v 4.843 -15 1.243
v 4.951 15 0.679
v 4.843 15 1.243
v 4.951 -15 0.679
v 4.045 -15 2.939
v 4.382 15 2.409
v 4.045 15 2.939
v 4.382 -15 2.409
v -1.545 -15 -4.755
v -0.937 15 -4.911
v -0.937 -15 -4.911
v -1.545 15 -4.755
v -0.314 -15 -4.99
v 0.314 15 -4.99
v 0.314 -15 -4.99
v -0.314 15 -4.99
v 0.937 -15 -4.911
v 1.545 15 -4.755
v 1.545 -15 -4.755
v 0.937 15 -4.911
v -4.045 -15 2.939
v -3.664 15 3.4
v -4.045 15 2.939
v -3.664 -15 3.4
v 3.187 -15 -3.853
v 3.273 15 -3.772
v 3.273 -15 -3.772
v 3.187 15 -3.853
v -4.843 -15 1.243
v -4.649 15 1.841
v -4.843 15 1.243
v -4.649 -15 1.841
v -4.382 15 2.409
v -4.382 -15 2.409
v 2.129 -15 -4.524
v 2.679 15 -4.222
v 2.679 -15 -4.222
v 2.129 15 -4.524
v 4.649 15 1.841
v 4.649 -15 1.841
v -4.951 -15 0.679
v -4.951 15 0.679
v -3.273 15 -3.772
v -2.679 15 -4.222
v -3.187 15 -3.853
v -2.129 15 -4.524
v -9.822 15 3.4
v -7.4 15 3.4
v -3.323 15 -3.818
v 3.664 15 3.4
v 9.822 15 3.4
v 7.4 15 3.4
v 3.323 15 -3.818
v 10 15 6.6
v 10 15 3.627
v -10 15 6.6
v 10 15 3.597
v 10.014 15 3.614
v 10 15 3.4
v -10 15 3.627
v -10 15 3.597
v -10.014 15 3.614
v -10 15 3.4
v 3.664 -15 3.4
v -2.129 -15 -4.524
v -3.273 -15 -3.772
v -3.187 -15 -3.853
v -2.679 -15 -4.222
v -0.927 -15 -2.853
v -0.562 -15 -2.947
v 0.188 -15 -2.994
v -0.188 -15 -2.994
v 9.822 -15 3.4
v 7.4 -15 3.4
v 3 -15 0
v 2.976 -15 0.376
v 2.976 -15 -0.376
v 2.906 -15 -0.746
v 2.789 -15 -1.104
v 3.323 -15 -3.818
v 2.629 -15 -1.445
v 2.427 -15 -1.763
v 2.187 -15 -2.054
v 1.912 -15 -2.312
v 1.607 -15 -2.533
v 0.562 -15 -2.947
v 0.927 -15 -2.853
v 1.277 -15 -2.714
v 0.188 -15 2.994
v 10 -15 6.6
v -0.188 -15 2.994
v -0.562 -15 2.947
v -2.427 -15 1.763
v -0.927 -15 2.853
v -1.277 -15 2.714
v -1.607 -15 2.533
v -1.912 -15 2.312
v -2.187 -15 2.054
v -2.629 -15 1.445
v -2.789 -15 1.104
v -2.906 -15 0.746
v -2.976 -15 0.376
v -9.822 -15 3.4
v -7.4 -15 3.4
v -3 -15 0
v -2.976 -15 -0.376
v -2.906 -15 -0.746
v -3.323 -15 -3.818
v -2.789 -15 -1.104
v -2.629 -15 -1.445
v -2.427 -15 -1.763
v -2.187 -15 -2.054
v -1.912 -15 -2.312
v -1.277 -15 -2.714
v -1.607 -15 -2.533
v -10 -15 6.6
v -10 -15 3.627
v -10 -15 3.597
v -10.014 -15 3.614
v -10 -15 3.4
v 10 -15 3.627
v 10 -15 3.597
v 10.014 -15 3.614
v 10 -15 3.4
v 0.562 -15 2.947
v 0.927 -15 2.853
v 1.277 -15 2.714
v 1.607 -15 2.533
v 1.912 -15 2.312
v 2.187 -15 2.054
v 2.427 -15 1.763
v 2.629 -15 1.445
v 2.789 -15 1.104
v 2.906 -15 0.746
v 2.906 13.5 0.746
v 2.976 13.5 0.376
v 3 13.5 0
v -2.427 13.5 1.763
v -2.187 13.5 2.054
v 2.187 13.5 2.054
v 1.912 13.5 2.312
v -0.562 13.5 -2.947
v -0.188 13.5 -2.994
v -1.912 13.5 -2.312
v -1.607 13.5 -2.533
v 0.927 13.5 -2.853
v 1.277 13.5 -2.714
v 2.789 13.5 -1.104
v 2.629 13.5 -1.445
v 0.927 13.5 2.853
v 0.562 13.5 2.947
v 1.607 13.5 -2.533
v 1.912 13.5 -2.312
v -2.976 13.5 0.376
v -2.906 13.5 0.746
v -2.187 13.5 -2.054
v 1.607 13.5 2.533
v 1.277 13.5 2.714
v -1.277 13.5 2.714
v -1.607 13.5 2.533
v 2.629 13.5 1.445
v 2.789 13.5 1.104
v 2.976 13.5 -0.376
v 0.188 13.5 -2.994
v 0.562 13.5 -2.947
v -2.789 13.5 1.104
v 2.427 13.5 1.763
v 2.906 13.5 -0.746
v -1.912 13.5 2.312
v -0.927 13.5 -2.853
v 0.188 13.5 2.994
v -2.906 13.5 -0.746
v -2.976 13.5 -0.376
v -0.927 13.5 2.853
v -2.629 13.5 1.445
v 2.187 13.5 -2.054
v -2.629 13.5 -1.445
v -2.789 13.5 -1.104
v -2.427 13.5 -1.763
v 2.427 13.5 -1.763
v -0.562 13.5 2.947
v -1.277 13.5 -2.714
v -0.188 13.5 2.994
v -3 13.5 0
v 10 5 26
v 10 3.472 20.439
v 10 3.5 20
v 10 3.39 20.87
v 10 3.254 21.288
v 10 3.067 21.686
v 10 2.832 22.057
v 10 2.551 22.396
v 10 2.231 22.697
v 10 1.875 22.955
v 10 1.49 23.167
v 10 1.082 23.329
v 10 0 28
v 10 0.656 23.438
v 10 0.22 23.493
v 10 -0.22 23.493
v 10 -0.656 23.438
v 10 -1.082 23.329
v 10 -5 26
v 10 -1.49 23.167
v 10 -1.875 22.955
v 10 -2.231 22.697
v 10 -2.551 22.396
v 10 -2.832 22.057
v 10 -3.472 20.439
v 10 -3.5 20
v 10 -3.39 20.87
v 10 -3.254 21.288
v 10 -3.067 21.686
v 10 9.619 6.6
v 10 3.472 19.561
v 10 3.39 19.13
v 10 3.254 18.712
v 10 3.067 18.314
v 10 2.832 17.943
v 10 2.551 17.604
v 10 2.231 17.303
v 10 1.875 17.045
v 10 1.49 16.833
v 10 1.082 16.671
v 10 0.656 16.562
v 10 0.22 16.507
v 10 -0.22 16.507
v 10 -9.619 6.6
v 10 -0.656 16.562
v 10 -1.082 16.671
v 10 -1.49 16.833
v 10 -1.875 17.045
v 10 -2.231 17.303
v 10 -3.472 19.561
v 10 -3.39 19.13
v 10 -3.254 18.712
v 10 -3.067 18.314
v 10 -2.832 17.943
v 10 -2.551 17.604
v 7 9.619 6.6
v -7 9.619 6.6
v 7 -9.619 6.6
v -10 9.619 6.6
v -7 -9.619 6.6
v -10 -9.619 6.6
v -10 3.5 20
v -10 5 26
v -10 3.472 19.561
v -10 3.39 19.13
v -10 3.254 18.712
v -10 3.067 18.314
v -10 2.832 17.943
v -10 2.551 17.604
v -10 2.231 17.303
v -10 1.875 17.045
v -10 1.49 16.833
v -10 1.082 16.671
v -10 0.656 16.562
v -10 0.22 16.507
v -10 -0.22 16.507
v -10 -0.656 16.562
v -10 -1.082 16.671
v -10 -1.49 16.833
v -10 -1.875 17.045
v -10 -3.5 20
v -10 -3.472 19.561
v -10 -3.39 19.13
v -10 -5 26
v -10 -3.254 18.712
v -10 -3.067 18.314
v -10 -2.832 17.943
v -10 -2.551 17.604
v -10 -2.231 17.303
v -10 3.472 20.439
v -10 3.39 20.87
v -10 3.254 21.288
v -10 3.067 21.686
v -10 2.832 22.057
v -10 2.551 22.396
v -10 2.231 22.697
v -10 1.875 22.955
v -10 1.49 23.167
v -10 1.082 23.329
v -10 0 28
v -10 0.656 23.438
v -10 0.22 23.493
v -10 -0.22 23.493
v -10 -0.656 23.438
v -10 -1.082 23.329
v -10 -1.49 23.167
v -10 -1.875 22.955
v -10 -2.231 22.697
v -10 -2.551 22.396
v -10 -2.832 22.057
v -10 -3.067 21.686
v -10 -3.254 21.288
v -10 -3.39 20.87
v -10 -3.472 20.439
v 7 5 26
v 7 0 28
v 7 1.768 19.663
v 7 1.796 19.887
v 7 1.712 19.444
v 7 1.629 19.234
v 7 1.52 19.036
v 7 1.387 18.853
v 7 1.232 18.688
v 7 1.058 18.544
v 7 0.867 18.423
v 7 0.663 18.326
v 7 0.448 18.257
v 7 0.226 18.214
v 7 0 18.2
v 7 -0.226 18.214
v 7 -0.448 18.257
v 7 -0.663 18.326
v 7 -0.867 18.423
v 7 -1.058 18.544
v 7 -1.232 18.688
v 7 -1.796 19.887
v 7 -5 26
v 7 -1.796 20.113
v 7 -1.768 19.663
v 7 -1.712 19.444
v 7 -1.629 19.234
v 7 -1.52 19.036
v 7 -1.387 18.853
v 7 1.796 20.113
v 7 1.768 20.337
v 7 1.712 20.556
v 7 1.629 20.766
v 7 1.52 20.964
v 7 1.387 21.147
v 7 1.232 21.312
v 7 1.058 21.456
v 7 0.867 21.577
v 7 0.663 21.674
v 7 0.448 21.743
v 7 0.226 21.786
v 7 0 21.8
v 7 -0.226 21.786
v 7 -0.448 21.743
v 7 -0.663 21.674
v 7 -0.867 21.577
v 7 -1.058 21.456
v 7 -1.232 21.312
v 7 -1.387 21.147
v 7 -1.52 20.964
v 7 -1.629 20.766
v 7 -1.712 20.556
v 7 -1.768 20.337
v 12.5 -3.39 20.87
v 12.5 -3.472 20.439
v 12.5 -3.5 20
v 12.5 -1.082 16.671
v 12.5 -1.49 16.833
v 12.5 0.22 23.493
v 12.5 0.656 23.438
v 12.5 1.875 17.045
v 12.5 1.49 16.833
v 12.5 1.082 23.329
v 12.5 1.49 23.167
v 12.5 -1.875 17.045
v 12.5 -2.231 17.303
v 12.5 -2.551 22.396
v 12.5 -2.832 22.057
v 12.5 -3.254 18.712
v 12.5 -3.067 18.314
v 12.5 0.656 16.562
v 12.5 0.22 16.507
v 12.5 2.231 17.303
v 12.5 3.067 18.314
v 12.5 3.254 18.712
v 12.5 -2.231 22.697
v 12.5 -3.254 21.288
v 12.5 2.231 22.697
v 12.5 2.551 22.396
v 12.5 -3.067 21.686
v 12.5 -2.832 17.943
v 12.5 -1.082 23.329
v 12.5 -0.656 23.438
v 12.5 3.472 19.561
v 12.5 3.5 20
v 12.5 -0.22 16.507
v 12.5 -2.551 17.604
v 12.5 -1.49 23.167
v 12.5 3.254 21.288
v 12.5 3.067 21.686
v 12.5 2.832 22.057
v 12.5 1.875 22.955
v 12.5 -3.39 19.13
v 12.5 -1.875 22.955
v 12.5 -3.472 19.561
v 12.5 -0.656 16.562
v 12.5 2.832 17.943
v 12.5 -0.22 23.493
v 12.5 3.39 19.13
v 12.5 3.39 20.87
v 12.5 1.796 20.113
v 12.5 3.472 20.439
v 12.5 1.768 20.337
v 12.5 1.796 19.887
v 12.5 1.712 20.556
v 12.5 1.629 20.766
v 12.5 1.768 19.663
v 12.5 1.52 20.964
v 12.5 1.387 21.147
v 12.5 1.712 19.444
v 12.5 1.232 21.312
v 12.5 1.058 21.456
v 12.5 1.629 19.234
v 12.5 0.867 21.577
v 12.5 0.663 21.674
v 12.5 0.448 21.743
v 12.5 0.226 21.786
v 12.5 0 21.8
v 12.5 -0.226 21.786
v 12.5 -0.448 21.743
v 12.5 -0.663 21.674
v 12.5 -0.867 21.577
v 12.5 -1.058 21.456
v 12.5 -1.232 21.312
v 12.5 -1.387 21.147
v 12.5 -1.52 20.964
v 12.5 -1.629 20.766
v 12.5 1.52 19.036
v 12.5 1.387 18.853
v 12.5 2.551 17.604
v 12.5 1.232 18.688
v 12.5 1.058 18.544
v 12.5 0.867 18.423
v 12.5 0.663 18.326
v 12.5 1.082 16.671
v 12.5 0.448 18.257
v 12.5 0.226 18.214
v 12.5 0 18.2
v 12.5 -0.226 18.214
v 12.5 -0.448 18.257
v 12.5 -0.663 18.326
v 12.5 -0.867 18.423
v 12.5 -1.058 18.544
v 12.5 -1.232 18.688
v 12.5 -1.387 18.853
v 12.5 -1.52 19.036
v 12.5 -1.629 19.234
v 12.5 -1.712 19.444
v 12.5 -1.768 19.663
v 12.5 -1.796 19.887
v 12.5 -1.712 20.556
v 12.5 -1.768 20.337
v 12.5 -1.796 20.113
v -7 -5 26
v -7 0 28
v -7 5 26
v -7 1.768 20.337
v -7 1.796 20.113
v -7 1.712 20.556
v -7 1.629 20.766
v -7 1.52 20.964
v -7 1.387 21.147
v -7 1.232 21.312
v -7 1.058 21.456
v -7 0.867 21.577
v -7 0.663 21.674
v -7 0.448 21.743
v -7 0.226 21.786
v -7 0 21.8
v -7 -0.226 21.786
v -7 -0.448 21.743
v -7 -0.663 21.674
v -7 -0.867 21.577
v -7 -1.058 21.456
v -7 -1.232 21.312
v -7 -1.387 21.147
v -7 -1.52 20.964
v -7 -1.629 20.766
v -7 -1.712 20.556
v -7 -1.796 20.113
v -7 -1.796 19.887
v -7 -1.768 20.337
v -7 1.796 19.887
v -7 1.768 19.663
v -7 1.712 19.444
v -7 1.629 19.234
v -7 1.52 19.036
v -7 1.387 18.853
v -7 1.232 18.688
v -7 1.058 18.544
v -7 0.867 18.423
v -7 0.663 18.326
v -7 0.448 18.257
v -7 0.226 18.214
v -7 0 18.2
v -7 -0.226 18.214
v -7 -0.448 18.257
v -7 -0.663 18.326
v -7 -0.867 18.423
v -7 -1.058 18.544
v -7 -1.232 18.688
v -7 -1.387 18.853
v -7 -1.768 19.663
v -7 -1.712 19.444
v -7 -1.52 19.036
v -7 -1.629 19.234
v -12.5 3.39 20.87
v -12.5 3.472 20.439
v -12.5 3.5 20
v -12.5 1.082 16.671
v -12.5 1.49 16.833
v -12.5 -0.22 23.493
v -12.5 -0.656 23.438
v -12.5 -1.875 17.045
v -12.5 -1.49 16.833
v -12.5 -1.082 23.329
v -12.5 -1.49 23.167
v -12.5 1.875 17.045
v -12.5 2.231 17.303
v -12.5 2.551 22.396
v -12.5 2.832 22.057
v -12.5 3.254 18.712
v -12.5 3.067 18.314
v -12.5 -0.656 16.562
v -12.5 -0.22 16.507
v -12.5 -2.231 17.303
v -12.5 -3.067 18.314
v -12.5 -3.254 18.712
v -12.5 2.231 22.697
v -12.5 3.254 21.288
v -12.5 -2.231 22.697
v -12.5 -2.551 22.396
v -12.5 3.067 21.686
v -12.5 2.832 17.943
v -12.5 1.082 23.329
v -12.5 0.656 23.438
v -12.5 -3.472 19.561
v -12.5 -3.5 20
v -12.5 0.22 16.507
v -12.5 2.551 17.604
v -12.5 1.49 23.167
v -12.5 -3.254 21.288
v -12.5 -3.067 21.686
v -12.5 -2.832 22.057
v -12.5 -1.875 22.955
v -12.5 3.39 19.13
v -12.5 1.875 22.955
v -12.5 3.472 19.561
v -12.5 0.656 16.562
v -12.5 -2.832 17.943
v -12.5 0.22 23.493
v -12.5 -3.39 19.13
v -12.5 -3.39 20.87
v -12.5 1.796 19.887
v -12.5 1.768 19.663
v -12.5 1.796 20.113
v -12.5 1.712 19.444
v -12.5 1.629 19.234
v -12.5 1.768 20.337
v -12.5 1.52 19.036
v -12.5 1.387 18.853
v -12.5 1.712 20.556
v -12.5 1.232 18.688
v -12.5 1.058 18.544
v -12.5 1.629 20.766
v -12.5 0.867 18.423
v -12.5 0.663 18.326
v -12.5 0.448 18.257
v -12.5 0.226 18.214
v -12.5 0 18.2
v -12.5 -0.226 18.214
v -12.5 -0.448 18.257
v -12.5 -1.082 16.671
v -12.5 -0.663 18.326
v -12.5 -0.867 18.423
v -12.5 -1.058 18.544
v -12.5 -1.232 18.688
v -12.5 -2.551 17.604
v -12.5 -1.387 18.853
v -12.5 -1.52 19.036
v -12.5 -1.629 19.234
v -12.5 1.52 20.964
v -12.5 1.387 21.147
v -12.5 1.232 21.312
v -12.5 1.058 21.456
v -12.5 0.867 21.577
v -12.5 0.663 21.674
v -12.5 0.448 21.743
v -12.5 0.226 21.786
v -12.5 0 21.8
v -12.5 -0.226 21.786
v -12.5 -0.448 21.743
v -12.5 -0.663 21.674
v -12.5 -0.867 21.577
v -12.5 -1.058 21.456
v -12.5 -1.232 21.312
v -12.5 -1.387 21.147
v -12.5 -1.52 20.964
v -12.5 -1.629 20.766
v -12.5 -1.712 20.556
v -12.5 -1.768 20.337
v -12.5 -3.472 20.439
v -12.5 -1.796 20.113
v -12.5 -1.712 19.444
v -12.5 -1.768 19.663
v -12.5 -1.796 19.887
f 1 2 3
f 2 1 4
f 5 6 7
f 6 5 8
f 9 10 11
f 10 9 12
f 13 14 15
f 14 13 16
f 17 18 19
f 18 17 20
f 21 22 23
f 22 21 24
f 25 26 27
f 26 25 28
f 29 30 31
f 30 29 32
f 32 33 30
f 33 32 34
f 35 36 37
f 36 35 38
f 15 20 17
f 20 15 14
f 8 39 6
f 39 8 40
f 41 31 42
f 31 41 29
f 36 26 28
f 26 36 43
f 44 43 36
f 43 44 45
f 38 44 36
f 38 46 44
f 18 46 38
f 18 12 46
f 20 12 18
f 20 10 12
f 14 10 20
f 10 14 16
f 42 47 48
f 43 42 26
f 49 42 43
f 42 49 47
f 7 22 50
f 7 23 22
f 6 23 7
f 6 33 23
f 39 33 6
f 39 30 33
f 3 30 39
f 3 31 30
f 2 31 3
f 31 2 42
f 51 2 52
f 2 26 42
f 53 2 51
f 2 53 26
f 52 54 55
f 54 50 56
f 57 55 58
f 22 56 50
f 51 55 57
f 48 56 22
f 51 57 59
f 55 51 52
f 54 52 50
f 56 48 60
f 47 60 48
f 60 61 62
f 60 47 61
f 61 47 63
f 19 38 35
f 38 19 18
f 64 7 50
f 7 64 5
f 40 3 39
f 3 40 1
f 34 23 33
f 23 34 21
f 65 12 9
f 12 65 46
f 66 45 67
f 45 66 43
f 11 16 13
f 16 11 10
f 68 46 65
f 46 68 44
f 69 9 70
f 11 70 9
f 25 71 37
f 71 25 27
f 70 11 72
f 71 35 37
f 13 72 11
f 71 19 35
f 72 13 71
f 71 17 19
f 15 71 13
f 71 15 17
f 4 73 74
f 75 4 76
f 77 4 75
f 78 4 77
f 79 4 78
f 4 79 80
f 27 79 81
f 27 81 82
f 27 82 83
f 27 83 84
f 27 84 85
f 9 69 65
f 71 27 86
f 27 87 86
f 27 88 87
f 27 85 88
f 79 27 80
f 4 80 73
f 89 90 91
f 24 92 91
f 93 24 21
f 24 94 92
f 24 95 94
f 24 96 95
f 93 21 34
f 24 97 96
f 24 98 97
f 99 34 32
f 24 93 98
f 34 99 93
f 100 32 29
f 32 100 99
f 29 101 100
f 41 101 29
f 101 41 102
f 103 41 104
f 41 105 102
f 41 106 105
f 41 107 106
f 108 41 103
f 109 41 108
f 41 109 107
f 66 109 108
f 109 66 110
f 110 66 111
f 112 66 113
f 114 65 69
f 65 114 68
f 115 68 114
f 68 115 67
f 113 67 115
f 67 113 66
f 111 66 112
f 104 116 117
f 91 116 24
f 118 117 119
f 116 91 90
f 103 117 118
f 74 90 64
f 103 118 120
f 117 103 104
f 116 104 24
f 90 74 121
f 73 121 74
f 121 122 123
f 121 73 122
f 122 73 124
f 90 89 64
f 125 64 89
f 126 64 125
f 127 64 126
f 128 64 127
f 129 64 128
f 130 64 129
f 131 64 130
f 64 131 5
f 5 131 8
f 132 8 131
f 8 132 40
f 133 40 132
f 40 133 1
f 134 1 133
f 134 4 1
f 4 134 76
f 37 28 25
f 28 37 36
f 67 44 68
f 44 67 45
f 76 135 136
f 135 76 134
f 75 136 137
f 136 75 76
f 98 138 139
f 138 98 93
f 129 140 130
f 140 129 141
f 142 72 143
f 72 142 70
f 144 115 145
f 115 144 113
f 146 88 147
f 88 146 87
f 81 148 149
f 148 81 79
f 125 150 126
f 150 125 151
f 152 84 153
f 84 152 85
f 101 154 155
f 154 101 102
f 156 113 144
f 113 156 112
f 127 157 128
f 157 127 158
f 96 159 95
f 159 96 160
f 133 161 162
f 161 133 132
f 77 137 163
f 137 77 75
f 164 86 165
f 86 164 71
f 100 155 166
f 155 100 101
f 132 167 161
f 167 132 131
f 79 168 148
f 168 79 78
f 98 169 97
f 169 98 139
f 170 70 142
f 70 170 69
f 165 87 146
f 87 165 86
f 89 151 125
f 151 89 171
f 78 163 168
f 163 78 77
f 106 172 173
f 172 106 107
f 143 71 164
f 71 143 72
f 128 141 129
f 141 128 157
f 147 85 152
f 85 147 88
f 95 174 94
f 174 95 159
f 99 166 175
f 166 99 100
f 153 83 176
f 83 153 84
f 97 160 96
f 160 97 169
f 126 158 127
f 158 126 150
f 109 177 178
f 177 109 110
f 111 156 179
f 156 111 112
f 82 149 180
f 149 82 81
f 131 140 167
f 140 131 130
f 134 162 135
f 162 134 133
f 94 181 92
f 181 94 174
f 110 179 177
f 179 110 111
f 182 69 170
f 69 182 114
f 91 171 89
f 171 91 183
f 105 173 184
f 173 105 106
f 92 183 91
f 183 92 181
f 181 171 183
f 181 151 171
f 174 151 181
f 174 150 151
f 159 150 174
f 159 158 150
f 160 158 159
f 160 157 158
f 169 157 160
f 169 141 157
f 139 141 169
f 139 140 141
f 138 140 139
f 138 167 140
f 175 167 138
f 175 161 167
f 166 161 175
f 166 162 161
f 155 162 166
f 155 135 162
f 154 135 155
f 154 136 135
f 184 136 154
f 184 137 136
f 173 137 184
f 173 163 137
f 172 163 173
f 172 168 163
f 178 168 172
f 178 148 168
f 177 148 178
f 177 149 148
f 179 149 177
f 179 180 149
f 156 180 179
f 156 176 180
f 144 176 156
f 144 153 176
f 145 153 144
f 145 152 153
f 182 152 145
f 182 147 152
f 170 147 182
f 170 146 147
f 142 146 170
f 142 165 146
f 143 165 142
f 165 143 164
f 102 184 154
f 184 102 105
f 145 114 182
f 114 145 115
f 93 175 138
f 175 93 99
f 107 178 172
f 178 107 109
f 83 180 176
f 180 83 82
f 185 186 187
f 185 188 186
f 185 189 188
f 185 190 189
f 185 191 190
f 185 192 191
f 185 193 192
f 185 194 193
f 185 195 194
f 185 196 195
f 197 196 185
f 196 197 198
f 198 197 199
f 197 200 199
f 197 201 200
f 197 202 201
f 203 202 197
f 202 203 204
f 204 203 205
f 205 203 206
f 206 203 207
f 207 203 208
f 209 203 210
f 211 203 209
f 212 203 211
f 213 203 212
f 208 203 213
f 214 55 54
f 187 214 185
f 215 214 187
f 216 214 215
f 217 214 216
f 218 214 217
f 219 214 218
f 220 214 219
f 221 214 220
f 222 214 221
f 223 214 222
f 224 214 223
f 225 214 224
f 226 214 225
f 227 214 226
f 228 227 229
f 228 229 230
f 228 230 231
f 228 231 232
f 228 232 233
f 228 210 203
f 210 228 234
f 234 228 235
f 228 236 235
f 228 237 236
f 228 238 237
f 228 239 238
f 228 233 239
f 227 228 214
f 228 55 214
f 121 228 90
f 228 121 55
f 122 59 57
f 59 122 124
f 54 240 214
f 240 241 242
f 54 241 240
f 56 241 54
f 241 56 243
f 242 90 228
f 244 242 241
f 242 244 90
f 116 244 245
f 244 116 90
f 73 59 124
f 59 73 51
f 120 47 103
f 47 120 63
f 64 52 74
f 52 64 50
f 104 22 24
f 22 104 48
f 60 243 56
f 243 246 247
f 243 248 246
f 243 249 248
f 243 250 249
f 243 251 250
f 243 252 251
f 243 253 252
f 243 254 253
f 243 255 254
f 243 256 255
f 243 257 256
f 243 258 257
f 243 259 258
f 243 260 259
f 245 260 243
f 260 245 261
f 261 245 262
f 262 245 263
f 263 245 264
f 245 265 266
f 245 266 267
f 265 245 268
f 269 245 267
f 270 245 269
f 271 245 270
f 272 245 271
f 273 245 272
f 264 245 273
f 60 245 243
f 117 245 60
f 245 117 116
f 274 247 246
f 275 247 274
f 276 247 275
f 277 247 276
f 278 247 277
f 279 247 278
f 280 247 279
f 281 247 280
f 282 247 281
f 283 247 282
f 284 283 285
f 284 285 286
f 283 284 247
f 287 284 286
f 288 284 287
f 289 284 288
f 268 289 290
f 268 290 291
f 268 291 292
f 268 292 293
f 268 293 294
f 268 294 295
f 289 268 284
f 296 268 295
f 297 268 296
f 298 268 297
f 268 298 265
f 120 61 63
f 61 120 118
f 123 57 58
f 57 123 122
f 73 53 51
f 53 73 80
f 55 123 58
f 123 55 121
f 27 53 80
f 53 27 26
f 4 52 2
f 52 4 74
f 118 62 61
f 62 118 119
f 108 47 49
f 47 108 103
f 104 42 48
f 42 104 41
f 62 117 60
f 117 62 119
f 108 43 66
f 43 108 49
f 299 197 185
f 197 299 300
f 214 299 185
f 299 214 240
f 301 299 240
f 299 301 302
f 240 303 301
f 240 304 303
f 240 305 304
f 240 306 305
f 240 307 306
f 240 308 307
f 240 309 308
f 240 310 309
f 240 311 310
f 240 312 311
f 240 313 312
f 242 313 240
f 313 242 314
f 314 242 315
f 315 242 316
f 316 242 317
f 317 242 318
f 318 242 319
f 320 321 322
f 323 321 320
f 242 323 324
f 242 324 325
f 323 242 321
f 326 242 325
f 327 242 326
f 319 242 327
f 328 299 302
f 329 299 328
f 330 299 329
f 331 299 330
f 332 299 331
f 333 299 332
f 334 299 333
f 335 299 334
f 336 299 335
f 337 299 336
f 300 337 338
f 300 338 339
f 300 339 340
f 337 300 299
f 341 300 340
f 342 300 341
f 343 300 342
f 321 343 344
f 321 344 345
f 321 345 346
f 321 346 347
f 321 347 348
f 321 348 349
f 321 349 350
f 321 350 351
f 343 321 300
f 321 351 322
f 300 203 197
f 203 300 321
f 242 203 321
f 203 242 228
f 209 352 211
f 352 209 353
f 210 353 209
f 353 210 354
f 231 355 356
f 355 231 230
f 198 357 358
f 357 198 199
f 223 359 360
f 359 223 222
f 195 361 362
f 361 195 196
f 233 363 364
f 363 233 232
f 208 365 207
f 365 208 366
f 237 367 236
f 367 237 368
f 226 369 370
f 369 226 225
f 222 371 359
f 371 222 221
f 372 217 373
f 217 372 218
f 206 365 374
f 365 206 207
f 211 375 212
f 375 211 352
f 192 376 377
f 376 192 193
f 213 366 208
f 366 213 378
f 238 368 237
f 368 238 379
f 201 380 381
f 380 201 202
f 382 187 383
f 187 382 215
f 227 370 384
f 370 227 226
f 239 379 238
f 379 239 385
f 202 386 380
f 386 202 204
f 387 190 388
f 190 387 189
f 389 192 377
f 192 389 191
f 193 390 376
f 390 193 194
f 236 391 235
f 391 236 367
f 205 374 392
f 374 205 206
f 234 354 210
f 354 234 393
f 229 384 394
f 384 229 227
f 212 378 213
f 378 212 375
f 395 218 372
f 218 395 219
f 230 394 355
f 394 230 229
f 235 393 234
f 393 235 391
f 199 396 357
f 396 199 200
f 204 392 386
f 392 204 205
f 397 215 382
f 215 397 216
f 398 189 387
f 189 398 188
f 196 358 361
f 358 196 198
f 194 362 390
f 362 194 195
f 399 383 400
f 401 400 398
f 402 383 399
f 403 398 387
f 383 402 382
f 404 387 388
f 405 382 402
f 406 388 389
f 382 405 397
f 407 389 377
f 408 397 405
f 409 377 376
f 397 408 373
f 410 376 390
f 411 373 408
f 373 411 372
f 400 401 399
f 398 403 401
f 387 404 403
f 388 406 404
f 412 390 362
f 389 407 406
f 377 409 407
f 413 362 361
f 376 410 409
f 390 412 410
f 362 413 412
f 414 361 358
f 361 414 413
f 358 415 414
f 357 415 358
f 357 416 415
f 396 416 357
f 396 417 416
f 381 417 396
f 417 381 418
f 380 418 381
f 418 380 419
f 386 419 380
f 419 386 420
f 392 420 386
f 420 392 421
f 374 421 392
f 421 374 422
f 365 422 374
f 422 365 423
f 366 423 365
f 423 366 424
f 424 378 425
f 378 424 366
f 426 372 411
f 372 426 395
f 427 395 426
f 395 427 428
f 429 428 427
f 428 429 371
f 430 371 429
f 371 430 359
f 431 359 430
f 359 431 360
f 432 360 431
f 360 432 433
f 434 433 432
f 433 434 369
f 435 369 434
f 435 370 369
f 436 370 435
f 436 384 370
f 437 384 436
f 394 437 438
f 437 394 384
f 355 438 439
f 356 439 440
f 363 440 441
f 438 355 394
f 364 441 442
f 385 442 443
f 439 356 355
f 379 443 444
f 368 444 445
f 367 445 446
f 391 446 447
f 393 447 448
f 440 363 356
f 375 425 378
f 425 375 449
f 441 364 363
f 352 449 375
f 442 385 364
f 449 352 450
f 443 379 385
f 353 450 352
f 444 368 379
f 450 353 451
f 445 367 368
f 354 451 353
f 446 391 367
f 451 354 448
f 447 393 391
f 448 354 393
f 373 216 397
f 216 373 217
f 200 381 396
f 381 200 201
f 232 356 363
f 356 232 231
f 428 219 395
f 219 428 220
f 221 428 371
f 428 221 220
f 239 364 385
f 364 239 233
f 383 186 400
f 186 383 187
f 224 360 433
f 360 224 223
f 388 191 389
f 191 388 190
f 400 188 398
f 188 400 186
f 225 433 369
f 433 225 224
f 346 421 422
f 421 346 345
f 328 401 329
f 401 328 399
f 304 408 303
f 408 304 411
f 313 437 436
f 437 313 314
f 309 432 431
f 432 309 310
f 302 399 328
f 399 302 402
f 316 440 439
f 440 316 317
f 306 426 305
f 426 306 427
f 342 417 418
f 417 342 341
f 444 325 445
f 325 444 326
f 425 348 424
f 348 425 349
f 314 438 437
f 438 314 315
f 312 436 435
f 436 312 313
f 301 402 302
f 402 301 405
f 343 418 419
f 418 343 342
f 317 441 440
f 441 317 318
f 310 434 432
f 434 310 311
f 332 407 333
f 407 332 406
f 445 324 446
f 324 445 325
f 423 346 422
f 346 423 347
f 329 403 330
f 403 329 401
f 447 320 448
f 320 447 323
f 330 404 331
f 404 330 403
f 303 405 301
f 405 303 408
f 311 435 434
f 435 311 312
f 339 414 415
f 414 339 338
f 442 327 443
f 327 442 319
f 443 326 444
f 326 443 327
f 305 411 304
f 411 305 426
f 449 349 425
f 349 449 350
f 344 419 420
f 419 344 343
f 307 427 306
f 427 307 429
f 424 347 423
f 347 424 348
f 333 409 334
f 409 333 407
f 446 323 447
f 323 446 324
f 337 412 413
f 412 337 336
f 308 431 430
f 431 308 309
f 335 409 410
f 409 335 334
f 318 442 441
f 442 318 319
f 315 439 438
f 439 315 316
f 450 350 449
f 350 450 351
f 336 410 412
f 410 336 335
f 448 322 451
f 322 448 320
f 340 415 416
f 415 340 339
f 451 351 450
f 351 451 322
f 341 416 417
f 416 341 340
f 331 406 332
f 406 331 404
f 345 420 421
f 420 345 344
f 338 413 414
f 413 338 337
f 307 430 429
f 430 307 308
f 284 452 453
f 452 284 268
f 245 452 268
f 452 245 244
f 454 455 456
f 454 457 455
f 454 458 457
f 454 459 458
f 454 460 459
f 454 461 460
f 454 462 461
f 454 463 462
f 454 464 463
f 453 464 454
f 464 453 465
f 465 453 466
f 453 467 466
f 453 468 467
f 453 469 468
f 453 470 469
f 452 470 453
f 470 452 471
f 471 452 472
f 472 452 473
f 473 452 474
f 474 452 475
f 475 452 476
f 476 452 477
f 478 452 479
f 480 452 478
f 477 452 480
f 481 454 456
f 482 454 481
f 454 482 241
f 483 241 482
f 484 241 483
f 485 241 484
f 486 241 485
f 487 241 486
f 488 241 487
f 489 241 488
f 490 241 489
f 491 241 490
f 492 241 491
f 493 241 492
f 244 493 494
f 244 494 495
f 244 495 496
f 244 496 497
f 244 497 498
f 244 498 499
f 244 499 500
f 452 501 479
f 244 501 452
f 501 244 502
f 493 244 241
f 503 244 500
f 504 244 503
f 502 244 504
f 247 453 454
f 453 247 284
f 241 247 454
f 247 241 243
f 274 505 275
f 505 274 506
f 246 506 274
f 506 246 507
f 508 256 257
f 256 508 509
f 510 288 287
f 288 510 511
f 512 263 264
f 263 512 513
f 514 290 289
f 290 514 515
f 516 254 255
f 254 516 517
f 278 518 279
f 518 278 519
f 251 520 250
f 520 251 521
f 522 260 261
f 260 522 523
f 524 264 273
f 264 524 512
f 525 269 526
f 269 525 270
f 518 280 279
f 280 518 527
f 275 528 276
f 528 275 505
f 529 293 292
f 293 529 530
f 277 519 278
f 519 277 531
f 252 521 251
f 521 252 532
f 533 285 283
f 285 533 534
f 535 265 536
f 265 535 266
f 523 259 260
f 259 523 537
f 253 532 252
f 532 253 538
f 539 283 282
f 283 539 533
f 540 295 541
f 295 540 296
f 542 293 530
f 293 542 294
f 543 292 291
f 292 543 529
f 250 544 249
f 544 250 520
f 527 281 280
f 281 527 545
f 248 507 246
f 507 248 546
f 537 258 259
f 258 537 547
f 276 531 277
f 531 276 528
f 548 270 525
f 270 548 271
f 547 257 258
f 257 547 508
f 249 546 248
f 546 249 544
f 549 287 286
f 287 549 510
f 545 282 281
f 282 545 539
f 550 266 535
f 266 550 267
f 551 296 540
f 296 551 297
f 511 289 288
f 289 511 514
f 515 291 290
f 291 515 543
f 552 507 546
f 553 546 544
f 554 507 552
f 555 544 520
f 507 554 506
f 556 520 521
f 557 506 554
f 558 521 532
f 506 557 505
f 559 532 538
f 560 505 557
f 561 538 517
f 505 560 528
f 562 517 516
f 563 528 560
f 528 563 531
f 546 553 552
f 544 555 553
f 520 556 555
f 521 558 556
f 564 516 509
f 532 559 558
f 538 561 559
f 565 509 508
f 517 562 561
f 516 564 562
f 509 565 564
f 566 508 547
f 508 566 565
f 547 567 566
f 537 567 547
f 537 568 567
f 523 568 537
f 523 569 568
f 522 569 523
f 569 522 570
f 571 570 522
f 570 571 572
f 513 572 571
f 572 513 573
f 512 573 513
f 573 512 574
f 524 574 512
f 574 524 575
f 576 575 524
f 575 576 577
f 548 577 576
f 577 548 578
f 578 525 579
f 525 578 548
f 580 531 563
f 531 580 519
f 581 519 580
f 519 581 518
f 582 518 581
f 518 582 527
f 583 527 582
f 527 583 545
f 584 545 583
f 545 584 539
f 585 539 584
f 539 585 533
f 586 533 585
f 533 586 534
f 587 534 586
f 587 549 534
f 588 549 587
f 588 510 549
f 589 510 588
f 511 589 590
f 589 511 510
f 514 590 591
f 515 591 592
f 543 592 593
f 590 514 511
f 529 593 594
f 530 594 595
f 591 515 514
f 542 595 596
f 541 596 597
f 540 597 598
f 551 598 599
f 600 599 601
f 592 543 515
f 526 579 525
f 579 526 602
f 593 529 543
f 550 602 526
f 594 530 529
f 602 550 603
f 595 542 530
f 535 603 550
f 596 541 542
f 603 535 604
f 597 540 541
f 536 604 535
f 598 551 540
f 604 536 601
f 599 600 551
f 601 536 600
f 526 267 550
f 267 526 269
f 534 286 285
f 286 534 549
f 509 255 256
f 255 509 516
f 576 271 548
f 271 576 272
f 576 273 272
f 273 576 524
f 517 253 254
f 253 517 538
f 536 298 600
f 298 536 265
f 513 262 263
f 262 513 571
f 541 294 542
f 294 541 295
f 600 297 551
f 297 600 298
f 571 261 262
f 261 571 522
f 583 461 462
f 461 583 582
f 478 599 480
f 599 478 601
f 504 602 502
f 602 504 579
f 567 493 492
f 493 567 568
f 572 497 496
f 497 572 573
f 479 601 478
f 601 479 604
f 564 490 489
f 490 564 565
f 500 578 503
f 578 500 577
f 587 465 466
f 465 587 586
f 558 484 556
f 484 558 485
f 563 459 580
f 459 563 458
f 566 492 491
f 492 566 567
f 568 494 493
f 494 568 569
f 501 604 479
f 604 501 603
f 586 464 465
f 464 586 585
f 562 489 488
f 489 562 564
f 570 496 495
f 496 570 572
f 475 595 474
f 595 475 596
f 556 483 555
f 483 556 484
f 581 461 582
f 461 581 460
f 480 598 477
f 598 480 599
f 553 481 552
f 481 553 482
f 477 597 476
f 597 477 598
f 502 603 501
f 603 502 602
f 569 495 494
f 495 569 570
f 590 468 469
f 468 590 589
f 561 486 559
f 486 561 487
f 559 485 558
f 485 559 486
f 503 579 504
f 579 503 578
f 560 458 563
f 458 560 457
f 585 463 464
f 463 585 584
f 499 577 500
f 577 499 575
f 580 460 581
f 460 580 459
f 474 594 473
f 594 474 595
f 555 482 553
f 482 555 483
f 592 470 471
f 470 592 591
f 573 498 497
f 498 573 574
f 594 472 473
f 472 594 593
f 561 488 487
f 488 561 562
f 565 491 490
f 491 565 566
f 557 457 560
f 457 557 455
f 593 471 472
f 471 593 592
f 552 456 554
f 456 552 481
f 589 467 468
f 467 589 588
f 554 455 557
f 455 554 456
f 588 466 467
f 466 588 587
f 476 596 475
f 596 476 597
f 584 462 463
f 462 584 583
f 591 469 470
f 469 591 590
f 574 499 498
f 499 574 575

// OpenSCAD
module bottom(){
color("gray") {
translate([0,15,0])
rotate([90,0,0])
   difference(){
		cylinder(h=30,r=5);
	   translate([0,0,1.5]) cylinder(h=32,r=3);
	}
translate([0,0,5]) cube([20,30,3.2], center=true);
translate([6,0,0.5]) rotate([0,42,0]) cube([1.8,30,10], center=true);
translate([-6,0,0.5]) rotate([0,-42,0]) cube([1.8,30,10], center=true);
}
}

module wall(){
	difference() {
		rotate([90,0,90]) union() {
			color("blue")
			linear_extrude(height = w)
			polygon([ [-10,5],[-5,26],[0,28],[5,26],[10,5] ]) ;
			translate([0,20,0])
			cylinder(h=w+2,r=3.5, center=true);
		}
		translate([0,0,20]) 
		color("red") 
		rotate([0,90,0])
		cylinder(h=8,r=1.8, center=true);
	}
}

w=3;
$fn=50;
r=0;
//for(r=[0, 90]) {
//translate([- 22.5 + r/2,0,0]) {
bottom();
rotate([0,0,r]) {
	translate([10,0,0]) rotate([0,0,180]) wall();
	translate([-10,0,0]) wall();
}
//}
//}
